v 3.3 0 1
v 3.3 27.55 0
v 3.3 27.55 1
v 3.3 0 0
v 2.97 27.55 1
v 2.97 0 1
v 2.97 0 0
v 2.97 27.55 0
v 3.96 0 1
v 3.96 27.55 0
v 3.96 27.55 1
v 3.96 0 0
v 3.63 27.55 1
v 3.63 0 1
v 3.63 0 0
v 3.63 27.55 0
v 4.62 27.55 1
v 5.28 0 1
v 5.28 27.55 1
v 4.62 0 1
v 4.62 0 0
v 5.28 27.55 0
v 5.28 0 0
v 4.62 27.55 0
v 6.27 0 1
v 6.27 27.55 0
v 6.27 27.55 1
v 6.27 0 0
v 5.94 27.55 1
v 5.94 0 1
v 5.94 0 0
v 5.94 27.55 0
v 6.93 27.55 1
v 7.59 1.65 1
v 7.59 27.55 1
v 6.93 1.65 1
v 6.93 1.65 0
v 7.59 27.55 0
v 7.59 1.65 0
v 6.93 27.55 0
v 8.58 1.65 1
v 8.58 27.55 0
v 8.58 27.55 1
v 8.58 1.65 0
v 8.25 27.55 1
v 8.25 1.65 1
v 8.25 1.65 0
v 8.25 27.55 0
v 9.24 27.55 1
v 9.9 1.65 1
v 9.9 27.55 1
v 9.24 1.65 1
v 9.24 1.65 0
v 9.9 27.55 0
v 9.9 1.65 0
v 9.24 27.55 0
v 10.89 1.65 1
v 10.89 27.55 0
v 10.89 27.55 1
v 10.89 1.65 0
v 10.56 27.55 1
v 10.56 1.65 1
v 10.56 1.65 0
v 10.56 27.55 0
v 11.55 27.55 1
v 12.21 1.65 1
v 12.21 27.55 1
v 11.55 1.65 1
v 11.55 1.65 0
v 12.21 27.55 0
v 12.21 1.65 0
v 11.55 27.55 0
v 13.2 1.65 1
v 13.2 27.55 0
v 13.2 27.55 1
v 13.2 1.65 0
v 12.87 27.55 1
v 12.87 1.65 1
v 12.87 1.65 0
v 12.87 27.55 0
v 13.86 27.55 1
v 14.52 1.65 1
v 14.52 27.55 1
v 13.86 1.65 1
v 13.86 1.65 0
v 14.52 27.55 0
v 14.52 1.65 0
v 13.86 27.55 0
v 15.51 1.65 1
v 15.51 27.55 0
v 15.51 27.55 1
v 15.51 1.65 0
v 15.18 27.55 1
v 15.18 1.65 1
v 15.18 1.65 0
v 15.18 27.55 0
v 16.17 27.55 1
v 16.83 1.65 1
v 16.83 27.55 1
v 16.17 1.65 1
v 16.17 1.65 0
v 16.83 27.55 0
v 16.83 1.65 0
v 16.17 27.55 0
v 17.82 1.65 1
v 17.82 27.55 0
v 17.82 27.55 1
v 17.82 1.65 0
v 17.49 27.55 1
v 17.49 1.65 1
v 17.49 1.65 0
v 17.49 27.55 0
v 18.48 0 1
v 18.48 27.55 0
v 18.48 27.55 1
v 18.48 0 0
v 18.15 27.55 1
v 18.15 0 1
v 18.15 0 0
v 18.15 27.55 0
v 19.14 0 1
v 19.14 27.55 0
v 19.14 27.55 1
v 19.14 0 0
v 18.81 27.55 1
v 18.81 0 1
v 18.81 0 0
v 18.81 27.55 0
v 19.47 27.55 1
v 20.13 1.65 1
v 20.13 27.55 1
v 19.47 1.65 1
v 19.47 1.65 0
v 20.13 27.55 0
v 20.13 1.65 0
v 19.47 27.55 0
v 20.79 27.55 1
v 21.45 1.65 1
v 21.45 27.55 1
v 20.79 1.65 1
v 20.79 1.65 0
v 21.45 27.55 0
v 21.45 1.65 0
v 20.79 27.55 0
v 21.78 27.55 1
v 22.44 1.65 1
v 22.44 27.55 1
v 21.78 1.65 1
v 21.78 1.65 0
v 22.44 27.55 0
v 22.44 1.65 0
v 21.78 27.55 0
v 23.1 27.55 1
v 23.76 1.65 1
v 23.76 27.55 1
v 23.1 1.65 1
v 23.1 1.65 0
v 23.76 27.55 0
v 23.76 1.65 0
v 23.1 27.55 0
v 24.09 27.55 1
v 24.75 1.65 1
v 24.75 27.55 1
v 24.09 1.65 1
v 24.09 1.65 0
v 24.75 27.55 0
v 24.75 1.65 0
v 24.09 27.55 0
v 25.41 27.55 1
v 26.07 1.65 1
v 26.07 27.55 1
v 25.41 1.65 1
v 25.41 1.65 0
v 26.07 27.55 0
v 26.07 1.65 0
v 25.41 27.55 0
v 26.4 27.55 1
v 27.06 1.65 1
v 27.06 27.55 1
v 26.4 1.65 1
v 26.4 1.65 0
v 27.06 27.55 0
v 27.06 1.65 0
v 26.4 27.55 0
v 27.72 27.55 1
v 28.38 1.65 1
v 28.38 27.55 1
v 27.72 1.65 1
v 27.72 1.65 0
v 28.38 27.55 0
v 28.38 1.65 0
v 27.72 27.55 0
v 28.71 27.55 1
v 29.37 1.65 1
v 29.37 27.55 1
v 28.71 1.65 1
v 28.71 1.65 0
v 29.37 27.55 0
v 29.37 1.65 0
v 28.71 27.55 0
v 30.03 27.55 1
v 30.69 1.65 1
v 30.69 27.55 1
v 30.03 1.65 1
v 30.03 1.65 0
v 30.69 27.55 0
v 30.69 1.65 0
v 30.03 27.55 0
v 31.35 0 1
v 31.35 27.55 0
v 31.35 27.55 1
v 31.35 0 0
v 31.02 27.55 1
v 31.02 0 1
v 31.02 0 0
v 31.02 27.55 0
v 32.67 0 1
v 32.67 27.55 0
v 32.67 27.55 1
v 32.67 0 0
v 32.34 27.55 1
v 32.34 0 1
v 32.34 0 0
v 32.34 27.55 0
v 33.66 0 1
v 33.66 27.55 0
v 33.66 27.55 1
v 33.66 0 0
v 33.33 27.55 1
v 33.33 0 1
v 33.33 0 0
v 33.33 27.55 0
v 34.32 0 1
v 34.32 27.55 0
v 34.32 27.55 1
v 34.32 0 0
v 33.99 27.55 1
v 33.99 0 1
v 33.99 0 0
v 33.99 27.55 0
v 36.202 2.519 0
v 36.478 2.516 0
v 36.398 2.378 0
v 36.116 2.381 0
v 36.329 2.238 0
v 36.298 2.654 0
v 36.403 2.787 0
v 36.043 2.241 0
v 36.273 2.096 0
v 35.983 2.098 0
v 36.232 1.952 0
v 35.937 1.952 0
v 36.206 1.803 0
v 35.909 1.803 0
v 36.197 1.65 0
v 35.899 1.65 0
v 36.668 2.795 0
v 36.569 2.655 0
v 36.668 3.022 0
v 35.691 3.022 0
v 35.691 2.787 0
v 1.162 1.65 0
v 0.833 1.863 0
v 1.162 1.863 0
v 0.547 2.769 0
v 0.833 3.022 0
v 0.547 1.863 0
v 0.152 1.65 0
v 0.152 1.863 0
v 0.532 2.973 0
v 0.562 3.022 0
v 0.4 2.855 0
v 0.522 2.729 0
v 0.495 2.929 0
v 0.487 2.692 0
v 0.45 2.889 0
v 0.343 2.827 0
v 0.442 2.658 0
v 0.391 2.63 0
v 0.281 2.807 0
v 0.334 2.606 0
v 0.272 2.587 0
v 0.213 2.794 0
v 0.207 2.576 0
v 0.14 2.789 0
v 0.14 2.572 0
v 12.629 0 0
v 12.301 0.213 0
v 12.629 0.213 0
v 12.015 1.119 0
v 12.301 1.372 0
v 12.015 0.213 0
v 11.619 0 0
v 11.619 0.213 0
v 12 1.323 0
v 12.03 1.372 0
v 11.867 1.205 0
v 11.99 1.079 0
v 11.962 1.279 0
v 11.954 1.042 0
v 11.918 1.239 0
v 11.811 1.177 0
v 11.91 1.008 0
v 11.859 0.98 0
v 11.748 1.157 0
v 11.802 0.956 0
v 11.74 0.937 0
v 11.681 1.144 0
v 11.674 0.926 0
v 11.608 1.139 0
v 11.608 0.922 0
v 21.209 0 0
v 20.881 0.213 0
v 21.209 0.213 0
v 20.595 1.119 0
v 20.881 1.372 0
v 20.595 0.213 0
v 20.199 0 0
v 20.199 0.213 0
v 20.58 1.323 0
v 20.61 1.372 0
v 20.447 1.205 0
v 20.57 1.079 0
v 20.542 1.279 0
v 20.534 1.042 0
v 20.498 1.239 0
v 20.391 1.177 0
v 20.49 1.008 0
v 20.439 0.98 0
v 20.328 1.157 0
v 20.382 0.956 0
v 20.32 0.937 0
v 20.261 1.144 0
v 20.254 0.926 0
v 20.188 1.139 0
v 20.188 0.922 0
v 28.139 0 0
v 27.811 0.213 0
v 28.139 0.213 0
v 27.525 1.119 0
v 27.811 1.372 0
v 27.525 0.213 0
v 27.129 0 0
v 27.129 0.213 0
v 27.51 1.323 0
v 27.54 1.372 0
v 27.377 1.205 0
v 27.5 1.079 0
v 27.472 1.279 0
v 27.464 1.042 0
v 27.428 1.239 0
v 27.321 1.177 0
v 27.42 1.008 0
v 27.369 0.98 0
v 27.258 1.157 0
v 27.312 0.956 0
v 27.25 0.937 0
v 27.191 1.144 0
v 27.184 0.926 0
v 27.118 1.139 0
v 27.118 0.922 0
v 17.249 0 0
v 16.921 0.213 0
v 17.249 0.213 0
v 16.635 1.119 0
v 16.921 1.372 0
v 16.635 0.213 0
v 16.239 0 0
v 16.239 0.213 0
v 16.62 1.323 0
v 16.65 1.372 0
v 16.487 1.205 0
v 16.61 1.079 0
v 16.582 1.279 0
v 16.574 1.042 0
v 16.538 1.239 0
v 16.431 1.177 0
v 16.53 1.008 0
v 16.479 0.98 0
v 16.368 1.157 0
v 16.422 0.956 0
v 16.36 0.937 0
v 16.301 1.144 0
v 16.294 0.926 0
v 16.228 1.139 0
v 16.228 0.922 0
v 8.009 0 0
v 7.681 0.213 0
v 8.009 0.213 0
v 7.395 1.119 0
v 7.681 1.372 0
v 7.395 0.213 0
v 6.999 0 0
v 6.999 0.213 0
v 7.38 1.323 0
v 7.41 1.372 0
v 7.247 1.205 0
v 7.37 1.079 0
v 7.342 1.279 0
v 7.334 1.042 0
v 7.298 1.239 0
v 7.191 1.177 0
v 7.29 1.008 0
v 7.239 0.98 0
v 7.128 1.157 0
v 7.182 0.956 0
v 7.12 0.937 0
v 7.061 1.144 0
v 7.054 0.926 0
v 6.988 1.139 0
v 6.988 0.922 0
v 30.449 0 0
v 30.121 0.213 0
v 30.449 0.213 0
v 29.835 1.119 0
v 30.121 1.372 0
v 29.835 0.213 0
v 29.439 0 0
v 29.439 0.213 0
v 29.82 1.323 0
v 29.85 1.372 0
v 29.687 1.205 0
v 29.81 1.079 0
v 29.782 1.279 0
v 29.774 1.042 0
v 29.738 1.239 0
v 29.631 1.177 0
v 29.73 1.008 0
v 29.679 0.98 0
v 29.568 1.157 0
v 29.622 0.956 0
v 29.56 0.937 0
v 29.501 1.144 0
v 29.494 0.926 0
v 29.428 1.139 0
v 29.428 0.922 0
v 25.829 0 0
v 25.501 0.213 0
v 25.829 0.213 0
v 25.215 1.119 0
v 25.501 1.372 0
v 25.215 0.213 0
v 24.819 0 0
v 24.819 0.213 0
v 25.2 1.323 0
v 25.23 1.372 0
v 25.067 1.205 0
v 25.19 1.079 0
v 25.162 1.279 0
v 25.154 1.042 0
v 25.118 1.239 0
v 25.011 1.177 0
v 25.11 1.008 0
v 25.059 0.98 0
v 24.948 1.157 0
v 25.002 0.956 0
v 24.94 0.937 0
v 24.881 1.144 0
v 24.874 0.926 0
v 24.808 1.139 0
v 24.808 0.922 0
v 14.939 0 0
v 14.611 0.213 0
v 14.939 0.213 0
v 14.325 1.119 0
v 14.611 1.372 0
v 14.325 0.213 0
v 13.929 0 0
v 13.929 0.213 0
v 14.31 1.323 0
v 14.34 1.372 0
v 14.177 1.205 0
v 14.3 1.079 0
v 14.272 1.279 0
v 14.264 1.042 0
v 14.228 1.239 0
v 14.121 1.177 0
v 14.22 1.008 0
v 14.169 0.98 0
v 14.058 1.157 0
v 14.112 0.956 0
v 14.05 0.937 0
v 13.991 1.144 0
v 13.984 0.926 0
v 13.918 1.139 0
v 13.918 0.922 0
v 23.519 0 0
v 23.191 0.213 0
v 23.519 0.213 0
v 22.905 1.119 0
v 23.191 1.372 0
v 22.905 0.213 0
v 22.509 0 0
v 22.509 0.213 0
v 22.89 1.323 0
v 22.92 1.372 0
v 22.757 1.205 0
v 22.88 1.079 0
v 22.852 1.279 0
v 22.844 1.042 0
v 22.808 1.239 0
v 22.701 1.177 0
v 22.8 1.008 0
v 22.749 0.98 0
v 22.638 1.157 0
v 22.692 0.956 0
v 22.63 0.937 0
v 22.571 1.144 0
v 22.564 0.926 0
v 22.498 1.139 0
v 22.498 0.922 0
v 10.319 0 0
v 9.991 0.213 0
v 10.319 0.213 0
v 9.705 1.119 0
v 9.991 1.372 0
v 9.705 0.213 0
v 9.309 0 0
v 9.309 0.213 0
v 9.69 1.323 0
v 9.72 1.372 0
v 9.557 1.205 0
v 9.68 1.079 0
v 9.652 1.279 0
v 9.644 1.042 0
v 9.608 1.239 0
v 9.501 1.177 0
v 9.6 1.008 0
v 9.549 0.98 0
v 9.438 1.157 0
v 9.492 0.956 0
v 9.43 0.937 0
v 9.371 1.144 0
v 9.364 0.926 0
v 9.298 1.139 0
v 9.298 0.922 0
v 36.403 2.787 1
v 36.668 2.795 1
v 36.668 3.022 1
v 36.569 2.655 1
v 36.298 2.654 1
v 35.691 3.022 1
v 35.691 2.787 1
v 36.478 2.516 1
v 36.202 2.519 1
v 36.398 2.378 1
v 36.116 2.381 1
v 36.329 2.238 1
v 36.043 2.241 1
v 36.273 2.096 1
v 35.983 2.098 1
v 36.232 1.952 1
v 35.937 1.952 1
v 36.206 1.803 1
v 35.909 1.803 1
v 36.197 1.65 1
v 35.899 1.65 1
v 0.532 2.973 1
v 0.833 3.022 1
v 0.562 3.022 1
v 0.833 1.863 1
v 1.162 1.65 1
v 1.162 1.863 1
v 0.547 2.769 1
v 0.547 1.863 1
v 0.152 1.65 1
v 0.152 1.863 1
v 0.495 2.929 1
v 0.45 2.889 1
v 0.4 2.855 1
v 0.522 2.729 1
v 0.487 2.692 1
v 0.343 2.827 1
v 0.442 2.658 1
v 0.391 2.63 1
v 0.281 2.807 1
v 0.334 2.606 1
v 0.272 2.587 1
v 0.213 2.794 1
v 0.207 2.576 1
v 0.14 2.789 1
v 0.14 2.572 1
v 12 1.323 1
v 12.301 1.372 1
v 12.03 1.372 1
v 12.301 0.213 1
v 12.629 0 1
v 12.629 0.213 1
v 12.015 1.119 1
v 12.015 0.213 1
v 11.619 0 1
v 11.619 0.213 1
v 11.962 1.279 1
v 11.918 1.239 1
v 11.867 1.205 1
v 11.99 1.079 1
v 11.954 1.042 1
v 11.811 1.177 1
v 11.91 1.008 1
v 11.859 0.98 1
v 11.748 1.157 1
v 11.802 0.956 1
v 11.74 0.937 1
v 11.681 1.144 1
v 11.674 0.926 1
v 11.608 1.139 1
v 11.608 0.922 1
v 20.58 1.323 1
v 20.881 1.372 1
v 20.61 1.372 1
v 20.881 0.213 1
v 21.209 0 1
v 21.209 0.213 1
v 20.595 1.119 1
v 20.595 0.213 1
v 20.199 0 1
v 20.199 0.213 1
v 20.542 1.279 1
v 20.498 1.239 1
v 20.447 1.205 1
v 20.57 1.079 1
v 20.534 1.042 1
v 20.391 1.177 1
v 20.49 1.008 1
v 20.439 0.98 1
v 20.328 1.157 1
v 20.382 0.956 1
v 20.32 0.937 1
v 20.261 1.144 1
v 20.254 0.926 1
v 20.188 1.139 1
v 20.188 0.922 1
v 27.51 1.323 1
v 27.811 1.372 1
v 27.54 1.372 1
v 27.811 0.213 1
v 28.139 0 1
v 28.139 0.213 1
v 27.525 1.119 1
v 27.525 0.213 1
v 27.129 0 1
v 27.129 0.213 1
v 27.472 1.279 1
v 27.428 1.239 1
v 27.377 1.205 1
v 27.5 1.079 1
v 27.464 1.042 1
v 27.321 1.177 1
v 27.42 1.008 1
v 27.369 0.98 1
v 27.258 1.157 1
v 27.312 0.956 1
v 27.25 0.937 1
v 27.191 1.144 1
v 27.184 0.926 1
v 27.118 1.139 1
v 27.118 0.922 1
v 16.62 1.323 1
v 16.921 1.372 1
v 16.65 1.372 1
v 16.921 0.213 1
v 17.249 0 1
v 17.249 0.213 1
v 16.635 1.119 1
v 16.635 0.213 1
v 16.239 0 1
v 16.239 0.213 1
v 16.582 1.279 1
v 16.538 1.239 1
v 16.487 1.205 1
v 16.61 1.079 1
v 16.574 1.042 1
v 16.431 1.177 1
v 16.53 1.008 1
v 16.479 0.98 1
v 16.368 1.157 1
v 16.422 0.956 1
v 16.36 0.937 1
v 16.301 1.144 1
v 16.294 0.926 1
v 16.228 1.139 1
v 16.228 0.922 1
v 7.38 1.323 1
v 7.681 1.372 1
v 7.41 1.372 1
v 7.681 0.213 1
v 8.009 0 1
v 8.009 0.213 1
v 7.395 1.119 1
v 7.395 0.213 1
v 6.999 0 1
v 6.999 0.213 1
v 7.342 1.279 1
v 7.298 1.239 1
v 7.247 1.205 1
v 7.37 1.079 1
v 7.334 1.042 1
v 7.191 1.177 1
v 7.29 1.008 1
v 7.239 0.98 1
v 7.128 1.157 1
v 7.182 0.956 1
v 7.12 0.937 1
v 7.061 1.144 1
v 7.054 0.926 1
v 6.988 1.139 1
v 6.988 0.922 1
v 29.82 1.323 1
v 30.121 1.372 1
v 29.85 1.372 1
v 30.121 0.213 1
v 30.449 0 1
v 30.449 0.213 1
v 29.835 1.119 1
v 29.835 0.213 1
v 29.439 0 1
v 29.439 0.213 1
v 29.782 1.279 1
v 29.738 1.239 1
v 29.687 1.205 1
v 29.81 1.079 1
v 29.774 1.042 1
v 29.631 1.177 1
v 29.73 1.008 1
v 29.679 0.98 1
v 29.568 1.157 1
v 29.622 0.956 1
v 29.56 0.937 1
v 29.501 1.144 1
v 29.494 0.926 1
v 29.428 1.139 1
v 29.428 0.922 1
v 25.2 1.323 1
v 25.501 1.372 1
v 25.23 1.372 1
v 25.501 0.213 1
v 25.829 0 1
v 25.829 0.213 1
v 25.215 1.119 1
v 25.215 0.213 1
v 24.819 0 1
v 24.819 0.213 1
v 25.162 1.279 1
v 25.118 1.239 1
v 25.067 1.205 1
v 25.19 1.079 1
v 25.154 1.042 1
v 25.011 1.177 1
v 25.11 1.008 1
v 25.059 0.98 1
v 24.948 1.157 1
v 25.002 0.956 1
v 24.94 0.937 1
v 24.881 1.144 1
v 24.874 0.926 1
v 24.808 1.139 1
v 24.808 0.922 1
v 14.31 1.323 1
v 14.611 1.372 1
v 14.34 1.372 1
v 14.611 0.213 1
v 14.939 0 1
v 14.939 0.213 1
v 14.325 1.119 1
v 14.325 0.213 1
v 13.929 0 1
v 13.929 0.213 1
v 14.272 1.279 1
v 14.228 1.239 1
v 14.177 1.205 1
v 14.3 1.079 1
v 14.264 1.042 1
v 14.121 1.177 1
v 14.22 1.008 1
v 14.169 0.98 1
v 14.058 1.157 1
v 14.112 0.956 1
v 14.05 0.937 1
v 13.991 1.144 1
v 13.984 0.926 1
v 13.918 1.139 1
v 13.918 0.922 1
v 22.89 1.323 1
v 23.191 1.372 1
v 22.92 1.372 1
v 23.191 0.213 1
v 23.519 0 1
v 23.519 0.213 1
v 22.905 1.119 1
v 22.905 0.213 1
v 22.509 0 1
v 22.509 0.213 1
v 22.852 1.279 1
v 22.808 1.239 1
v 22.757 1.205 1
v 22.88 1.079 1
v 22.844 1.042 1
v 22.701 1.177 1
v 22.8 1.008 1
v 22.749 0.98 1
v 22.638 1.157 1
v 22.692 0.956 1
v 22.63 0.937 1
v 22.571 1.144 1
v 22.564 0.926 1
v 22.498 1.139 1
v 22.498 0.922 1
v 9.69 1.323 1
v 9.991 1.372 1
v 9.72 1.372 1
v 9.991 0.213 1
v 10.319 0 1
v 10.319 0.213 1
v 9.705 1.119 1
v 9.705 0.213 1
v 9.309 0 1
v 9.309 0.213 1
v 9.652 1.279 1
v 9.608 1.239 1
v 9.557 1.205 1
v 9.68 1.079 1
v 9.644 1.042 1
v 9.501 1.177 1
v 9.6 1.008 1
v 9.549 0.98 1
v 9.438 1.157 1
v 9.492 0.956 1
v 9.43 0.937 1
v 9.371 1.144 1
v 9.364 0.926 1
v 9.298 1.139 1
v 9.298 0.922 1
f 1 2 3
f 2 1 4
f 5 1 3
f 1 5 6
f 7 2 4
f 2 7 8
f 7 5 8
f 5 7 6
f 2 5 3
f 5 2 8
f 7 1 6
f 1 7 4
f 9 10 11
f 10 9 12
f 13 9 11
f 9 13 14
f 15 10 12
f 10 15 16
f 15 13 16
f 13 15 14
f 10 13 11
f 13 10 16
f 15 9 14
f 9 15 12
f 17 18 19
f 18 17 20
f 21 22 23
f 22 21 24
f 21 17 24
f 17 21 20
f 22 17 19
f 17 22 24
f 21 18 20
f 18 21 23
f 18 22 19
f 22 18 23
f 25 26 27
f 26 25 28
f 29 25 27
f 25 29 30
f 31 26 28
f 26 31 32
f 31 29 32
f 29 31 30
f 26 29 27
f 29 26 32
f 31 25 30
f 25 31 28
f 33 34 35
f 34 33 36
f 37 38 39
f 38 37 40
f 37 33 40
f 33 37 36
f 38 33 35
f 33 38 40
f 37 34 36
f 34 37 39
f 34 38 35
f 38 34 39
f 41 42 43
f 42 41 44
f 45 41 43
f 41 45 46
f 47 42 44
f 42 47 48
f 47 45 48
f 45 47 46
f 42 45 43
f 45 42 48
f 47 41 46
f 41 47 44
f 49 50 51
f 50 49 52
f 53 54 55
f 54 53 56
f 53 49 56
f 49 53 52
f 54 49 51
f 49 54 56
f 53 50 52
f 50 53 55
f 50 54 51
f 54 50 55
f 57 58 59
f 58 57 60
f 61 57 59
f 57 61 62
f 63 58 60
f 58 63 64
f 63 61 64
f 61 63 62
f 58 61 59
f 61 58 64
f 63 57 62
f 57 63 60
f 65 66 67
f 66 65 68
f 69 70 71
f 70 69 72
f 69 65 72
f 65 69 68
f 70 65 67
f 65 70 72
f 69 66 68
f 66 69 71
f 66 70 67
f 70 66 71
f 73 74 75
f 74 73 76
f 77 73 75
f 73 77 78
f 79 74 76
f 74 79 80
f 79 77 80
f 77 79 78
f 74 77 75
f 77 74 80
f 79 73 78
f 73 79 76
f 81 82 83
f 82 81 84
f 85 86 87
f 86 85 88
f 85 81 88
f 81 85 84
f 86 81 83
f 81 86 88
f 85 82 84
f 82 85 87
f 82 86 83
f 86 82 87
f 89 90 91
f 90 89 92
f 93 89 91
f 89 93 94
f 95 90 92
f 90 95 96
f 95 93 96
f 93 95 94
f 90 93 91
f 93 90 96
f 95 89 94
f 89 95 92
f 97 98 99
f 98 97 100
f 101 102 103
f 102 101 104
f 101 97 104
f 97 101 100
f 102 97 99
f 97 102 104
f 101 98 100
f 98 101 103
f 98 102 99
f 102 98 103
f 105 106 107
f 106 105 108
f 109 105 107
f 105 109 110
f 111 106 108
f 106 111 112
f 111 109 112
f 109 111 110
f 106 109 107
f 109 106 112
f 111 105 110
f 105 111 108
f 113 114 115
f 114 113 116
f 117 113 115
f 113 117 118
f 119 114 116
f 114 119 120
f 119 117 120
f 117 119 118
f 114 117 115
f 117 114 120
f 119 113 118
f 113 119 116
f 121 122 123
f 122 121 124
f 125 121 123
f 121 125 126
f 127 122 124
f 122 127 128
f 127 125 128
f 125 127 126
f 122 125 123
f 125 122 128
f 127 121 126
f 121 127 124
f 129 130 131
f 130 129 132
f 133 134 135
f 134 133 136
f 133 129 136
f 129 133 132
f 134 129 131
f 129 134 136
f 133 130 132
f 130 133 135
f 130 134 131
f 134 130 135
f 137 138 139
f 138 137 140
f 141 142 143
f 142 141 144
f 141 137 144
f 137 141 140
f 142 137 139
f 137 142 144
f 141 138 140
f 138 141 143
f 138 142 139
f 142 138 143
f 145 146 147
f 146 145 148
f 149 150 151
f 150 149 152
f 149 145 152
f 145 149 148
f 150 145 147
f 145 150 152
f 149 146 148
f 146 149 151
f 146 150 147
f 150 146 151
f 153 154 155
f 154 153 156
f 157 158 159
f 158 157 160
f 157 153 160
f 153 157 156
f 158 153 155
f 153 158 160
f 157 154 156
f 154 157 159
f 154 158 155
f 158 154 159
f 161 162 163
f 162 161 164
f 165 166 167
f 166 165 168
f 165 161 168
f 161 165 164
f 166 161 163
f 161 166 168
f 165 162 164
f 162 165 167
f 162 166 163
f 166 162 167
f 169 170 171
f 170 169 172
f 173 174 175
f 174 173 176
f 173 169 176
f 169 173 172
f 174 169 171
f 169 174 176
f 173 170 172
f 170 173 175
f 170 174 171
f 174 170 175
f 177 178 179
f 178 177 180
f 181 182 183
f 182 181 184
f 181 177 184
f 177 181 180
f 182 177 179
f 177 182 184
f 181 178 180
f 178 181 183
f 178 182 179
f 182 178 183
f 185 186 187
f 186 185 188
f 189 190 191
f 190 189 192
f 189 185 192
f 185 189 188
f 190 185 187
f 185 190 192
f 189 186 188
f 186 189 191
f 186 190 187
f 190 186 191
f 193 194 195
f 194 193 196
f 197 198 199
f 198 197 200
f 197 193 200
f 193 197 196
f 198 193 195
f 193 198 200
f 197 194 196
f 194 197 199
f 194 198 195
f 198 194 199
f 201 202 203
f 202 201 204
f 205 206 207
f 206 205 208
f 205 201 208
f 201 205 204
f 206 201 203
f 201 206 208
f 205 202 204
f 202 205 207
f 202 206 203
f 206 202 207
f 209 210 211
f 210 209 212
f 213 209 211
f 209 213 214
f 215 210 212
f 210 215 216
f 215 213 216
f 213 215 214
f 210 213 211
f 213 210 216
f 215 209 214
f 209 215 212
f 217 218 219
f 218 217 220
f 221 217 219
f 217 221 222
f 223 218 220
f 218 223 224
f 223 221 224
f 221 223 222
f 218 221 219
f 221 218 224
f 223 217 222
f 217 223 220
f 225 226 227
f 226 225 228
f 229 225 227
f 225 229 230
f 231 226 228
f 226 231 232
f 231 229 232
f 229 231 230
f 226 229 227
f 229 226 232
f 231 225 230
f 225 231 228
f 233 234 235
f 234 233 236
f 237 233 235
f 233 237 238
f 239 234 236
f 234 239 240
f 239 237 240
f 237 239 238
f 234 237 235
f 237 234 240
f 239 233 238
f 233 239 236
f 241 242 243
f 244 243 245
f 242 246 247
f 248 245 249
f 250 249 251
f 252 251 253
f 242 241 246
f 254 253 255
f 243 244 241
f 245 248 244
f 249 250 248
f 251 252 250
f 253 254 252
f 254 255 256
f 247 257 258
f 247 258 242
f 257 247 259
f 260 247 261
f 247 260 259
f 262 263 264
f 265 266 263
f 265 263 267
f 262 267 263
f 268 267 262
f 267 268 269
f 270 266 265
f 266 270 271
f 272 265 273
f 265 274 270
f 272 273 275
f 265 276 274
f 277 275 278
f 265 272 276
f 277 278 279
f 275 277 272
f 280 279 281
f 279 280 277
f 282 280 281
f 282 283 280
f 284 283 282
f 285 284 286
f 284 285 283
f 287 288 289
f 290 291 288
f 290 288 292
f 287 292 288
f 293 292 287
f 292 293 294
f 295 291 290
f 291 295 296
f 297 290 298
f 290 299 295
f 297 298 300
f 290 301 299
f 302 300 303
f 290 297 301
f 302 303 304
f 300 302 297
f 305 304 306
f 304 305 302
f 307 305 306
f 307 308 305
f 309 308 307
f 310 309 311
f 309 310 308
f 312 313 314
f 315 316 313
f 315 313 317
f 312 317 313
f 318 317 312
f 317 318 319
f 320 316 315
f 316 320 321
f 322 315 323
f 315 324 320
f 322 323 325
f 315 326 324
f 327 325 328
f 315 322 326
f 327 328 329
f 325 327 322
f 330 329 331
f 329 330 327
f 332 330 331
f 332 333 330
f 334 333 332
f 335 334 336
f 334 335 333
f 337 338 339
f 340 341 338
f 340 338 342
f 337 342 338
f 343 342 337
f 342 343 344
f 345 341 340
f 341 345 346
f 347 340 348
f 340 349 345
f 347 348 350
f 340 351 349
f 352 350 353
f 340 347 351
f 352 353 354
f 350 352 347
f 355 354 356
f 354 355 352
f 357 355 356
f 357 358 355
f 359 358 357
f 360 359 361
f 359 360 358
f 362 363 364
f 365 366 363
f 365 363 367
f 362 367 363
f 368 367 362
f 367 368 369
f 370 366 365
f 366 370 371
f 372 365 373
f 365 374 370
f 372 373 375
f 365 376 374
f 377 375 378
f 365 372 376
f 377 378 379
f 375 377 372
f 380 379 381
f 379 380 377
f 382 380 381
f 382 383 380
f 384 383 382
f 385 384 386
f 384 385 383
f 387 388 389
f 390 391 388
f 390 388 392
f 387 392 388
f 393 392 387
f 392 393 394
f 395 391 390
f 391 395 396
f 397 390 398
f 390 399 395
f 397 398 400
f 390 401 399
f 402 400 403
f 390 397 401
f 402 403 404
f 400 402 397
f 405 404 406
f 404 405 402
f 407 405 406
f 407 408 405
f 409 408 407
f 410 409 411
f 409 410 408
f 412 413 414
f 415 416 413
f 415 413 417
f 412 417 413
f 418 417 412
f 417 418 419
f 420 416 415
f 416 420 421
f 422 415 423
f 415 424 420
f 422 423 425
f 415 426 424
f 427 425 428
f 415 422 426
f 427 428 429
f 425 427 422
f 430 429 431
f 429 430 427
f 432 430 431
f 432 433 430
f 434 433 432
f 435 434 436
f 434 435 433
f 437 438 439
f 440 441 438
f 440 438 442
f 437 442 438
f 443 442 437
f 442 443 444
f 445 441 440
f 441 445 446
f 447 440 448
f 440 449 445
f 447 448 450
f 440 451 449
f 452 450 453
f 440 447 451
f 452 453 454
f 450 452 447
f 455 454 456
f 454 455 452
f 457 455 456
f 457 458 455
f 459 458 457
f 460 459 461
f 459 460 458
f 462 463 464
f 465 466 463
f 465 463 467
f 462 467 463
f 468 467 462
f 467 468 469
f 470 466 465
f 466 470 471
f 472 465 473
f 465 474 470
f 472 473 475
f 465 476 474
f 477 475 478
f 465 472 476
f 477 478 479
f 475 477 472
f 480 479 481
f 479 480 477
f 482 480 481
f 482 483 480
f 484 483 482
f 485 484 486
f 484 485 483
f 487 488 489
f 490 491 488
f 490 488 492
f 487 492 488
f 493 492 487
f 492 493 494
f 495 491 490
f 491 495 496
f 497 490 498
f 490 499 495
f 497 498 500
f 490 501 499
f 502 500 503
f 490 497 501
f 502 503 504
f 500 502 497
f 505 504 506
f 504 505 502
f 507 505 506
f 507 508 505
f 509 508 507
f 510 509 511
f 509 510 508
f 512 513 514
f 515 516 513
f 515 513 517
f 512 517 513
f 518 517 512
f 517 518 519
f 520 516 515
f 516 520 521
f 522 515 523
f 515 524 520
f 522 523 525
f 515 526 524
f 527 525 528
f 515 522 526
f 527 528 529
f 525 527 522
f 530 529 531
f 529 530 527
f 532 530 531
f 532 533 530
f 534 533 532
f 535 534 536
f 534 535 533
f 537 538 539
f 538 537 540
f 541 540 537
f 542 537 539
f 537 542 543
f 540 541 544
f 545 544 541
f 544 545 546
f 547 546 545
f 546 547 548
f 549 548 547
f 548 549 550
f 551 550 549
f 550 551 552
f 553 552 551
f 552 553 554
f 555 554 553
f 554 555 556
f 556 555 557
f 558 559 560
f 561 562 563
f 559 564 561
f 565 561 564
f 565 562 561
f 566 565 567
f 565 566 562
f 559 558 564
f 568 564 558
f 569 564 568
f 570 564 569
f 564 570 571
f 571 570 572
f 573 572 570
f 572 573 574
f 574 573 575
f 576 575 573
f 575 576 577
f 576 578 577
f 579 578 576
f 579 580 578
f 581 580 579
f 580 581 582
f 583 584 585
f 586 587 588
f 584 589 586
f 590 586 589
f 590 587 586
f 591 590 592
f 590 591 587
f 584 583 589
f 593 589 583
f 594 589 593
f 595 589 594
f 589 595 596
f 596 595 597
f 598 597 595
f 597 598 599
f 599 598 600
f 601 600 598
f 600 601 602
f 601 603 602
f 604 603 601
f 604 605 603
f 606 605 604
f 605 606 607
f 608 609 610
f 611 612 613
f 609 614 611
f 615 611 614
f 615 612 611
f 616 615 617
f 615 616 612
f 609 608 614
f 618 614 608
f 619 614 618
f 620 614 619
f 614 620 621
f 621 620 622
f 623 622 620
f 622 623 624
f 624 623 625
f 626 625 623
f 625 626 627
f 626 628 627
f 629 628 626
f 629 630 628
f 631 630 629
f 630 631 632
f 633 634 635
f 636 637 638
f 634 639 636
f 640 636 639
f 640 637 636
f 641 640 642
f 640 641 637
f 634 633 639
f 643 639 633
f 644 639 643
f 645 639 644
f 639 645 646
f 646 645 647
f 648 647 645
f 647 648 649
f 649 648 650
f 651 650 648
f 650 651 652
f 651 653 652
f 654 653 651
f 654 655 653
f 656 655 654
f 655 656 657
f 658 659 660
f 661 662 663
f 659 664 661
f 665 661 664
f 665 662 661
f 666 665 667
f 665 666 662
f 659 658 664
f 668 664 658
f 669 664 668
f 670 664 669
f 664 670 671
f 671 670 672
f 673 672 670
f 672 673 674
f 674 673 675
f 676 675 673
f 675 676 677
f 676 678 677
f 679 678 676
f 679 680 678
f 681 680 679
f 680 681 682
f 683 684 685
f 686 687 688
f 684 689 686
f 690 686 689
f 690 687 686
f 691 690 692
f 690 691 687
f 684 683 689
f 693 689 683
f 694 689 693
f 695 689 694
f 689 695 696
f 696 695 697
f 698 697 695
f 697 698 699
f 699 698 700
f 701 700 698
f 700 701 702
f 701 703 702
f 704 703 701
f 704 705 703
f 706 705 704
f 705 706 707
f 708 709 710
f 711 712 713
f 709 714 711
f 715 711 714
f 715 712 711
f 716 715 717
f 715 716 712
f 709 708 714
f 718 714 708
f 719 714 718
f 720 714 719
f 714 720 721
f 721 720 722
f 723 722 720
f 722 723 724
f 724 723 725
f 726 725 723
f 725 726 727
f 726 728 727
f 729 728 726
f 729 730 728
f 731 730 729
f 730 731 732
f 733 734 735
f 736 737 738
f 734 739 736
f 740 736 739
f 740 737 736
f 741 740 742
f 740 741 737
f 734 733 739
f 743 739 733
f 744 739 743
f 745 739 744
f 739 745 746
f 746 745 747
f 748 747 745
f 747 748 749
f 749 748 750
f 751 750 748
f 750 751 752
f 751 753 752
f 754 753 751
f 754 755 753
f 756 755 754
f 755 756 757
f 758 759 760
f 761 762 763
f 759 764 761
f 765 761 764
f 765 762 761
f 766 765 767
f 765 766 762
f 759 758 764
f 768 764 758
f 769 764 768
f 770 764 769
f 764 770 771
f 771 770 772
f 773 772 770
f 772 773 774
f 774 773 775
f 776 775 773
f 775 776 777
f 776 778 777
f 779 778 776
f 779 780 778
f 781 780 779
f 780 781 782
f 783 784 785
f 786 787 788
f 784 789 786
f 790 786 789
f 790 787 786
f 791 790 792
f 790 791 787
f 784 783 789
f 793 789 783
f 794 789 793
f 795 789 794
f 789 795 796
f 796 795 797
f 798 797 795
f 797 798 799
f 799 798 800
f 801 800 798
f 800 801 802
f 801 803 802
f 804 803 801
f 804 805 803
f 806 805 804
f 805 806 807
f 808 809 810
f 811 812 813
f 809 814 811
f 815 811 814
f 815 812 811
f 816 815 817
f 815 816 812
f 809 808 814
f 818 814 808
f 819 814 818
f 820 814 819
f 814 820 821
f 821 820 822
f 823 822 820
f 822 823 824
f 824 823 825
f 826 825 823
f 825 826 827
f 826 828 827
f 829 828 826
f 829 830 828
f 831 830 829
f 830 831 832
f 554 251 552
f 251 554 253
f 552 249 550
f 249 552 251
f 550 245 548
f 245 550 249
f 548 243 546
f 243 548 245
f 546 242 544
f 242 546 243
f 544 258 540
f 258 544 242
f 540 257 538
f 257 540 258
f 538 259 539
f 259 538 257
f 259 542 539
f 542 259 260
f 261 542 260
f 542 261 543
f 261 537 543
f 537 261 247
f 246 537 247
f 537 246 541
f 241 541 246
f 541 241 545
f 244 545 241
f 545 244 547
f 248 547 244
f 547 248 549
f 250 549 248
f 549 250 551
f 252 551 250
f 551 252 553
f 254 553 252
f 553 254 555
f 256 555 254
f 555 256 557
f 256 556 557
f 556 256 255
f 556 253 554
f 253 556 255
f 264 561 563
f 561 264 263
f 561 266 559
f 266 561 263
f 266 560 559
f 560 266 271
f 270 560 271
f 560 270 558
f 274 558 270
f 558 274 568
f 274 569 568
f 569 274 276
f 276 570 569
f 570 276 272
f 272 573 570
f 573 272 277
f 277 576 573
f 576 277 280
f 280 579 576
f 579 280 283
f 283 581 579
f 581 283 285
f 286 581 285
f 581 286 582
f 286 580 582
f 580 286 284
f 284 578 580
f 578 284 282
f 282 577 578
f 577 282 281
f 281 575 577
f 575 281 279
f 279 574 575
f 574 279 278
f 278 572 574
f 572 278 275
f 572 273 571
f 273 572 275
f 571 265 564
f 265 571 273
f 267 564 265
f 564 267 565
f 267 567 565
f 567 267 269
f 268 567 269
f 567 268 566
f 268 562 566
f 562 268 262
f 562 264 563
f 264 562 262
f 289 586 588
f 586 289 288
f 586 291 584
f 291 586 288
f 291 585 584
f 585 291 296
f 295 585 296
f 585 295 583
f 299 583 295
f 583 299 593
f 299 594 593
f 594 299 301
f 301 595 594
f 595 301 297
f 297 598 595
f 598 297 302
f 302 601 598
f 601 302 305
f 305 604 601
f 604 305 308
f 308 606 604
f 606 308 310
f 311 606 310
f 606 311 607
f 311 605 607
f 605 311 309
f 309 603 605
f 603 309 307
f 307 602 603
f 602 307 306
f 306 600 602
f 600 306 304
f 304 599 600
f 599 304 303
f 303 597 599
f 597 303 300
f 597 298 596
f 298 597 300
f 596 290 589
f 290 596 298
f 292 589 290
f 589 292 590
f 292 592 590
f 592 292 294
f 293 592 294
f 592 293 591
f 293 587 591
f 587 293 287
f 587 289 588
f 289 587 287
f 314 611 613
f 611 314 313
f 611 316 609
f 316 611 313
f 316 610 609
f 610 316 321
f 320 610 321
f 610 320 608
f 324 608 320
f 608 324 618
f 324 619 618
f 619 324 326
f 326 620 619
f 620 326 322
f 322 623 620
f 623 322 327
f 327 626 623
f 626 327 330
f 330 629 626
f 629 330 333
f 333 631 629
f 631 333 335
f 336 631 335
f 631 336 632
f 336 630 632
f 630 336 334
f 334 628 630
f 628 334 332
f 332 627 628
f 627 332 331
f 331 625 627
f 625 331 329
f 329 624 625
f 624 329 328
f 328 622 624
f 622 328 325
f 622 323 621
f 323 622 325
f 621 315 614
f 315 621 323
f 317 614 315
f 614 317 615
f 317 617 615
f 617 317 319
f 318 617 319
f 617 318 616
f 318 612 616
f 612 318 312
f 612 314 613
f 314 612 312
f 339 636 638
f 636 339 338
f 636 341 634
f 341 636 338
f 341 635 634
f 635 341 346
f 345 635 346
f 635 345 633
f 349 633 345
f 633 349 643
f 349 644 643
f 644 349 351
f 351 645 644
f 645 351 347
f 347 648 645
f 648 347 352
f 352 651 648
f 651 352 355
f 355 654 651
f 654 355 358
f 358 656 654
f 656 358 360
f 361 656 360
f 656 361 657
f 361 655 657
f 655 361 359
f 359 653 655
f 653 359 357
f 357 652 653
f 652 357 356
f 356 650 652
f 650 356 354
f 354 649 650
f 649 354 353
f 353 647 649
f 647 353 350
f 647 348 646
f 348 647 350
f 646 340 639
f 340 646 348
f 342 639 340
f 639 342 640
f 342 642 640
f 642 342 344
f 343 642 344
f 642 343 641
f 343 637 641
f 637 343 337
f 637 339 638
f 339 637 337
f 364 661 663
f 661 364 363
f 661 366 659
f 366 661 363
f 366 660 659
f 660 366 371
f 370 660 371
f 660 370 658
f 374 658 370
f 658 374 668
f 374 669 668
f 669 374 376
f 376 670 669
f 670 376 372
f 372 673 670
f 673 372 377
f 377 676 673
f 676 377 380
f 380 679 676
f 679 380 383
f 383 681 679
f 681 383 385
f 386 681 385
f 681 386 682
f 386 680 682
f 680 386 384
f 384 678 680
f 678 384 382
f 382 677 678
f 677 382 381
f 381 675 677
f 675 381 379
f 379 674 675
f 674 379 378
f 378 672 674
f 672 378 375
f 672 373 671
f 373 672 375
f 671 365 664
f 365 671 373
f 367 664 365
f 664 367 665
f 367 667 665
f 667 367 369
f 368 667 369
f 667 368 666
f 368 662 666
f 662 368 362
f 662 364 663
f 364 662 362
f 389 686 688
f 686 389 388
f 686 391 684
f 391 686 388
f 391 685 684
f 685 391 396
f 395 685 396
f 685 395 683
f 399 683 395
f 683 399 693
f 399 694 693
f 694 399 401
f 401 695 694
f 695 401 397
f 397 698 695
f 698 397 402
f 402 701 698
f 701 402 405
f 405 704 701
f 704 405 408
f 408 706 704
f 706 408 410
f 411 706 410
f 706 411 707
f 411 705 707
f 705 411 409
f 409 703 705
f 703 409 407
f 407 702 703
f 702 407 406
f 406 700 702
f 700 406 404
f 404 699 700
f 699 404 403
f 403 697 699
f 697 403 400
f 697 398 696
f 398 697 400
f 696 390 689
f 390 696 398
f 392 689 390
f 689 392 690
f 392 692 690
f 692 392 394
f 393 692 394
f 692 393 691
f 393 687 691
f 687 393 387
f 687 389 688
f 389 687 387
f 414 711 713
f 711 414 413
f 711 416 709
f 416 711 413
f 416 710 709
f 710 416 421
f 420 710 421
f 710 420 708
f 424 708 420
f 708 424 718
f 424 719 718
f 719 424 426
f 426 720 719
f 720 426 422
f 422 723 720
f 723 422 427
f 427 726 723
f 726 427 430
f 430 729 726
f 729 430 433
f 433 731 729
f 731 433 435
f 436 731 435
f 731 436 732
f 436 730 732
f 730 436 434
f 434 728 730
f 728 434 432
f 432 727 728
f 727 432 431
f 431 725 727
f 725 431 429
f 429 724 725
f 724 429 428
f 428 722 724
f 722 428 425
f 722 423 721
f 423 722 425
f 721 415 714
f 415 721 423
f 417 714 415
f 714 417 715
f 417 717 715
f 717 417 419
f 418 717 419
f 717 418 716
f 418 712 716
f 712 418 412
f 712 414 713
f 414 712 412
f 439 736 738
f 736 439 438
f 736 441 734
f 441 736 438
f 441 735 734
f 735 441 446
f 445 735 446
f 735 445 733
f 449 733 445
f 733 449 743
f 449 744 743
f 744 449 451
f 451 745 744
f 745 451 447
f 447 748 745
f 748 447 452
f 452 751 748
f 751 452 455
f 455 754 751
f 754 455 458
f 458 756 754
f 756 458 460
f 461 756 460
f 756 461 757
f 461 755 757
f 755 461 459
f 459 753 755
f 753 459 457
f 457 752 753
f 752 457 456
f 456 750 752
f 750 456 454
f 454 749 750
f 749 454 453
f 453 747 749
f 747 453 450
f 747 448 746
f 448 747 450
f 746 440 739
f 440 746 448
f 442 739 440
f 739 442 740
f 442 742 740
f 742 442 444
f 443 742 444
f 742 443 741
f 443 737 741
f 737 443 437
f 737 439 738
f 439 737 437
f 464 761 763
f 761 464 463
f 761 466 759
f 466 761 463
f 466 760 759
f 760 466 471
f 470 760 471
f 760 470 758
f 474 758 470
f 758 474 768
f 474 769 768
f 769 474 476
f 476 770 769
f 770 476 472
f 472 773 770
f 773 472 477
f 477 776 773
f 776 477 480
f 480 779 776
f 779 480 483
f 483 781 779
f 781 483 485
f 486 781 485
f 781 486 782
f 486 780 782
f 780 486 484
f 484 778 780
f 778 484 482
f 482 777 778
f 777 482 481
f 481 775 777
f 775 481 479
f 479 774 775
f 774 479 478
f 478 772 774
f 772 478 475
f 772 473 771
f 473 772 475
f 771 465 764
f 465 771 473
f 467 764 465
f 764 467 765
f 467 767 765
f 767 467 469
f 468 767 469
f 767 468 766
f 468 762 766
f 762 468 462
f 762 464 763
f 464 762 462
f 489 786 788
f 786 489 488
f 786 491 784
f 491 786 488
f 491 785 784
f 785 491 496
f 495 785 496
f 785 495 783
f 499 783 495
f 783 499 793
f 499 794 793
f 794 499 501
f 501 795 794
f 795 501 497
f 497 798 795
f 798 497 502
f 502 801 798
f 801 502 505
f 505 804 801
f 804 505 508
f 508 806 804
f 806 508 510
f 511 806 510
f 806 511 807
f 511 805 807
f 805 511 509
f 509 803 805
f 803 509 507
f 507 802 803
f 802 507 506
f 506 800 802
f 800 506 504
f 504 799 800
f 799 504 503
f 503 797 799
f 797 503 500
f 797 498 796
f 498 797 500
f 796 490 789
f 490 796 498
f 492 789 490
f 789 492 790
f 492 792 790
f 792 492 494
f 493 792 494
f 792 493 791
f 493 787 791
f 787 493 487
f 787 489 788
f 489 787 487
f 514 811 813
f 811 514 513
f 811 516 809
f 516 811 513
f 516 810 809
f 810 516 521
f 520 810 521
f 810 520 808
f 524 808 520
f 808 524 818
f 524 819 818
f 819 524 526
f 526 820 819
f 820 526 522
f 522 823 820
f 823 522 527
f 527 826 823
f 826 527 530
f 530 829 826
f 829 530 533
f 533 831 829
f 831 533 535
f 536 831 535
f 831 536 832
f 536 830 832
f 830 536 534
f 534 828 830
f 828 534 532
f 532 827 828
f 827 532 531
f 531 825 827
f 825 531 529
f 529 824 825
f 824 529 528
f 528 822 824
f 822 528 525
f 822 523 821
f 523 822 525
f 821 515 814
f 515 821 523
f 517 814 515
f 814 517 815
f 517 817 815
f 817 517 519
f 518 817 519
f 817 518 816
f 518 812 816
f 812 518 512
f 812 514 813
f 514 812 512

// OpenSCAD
// file: ../../util/bitmap.scad
/*****************************************************************************
 * Module Bitmap Library
 * Modules to create bitmaps of unit squares from 1 or 2 dimensional vectors.
 *****************************************************************************
 * Copyright 2017 Chris Baker
 *
 * This program is free software: you can redistribute it and/or modify
 * it under the terms of the GNU Lesser General Public License as published by
 * the Free Software Foundation, either version 3 of the License, or
 * (at your option) any later version.
 *
 * This program is distributed in the hope that it will be useful,
 * but WITHOUT ANY WARRANTY; without even the implied warranty of
 * MERCHANTABILITY or FITNESS FOR A PARTICULAR PURPOSE.  See the
 * GNU Lesser General Public License for more details.
 *
 * You should have received a copy of the GNU Lesser General Public License
 * along with this program.  If not, see <http://www.gnu.org/licenses/>.
 *****************************************************************************
 * Usage:
 * Include this file with the "use" tag.
 * Depends on compat.scad library.
 *
 * API:
 *   1dbitmap(bitmap, center, expansion, vector_mode)
 *   2dbitmap(bitmap, center, expansion, vector_mode)
 *     Generate a 1 or 2-Dimensional field of modules based on the provided
 *     bitmap vector. See Bitmap Vectors below.
 *     The center flag determines whether to center the bitmap on the origin.
 *     The expansion value actually shrinks each cube in the x and y
 *     dimension by the specified amount.
 *     The vector_mode flag determines whether to create 3D solid geometry
 *     (unit cubes) or 2D vector geometry (squares).
 *
 * Bitmap Vectors:
 *   The bitmap vectors primarily provide boolean information.
 *   A module will be placed where these vectors have a postive value and
 *   skipped where they have a negative value. I.E. 0, -1, false, and undef
 *   are all equivalent and result in a skip. 1 and true are equivalent and
 *   result in a placed 1-unit module.
 *   Further, if the value is an integer it will be treated as a height for
 *   the module, allowing z-maps to be created.
 *   If the value is not an integer or boolean, it will be treated as a color
 *   reference. This can be a string or RGBA vector that will be used to
 *   color the module in the OpenSCAD preview window.
 *   In current versions of OpenSCAD, the color has no effect in the rendered
 *   view or STL output.
 *
 * Vector Mode:
 *   Although OpenSCAD supports generating 2D geometry, there are several
 *   caveats:
 *   - 2D and 3D geometry cannot be mixed
 *   - Extruding 2D geometry causes color information to be lost
 *   - All 2D geometry is projected onto the XY plane when rendering
 *   - Rendering also results in loss of color (same as 3D)
 *   - The SVG exporter is somewhat limited:
 *     - The pixel size of the image is hard-coded in the file
 *     - The title of the image is a generic string
 *     - The color selection for stroke and fill is fixed
 *     - The stroke-width is set to a large value that will cause overlap
 *     - The background is transparent
 *     - Only one path element is created with all of the geometry; there is
 *       no easy way to split up the geometry into multiple logical units.
 *     - These issues can mostly be resolved by hand-editing the file:
 *       - Remove or modify the width and height parameters from the svg
 *         element at the top of the file to provide better scaling.
 *       - Edit the title element at the top of the file to change the title.
 *       - Edit the stroke and fill parameters of the path element (these will
 *         probably be at the end of the file).
 *       - Set the stroke-width parameter for the path element to 0.
 *****************************************************************************/
use <compat.scad>

/*
 * 2dbitmap - Turn a 2D vector into a bitmap of cubes
 *
 * bitmap - 2D vector representing where to place each cube
 *          Value can either be boolean, z-height, or color
 * center - center cubes around the origin
 * expansion - size of gap around each pixel (screendoor)
 * vector_mode - create a 2D vector drawing instead of 3D extrusion
 */
module 2dbitmap(bitmap=[[1,0],[0,1]], center=false, expansion=0, vector_mode=false)
{
	ylen=len(bitmap)-1;

	for (y=[0:ylen]) {
		xlen=len(bitmap[y])-1;
		for (x=[0:xlen])
			translate([x-(center?xlen/2:0),ylen-y-(center?ylen/2:0),0])
				if (is_indexable(bitmap[y][x]))
					color(bitmap[y][x])
						if (vector_mode)
							square([1-expansion,1-expansion], center=center);
						else
							cube([1-expansion,1-expansion,1], center=center);
				else
					if (bitmap[y][x])
						if (vector_mode)
							square([1-expansion,1-expansion], center=center);
						else
							cube([1-expansion,1-expansion,clamp_nonnum(bitmap[y][x])], center=center);
	}
}

module 1dbitmap(bitmap=[1,0,1,0,1], center=false, expansion=0, vector_mode=false)
	2dbitmap([bitmap], center, expansion, vector_mode);

/*
 * Examples
 */

// 1D with z-height
translate([10,0,0]) scale([1,10,1])
	1dbitmap(bitmap=[1,1,0,2,0,0,3], expansion=.1);

// 1D with boolean
translate([-20,0,0]) scale([1,10,1])
	1dbitmap(bitmap=[true,false,true,false,true,true]);

// 2D with z-height
scale([2,2,1])
	2dbitmap(bitmap=[[1,0,2,1],[0,3,3,0],[1,1,0,1]],
		center=true);

// 1D with color
translate([0,-10,0]) scale([1,3,1])
	1dbitmap(bitmap=["red","white","blue",[0,0.3,0,0.5]]);

// 1D with color using 2D-vector-mode
translate([-7,-8,0]) scale([1,2])
	1dbitmap(bitmap=["red",0,"blue",0,"green"], vector_mode=true);
translate([-4.5,-10,0]) scale([1,2])
	1dbitmap(bitmap=["red",0,"blue",0,"green"], vector_mode=true, center=true);
// main file
/* Unit Test 09: All 1s (Automatic Checkdigit 7) */
use <../upc.scad>
UPC_A("11111111111");
